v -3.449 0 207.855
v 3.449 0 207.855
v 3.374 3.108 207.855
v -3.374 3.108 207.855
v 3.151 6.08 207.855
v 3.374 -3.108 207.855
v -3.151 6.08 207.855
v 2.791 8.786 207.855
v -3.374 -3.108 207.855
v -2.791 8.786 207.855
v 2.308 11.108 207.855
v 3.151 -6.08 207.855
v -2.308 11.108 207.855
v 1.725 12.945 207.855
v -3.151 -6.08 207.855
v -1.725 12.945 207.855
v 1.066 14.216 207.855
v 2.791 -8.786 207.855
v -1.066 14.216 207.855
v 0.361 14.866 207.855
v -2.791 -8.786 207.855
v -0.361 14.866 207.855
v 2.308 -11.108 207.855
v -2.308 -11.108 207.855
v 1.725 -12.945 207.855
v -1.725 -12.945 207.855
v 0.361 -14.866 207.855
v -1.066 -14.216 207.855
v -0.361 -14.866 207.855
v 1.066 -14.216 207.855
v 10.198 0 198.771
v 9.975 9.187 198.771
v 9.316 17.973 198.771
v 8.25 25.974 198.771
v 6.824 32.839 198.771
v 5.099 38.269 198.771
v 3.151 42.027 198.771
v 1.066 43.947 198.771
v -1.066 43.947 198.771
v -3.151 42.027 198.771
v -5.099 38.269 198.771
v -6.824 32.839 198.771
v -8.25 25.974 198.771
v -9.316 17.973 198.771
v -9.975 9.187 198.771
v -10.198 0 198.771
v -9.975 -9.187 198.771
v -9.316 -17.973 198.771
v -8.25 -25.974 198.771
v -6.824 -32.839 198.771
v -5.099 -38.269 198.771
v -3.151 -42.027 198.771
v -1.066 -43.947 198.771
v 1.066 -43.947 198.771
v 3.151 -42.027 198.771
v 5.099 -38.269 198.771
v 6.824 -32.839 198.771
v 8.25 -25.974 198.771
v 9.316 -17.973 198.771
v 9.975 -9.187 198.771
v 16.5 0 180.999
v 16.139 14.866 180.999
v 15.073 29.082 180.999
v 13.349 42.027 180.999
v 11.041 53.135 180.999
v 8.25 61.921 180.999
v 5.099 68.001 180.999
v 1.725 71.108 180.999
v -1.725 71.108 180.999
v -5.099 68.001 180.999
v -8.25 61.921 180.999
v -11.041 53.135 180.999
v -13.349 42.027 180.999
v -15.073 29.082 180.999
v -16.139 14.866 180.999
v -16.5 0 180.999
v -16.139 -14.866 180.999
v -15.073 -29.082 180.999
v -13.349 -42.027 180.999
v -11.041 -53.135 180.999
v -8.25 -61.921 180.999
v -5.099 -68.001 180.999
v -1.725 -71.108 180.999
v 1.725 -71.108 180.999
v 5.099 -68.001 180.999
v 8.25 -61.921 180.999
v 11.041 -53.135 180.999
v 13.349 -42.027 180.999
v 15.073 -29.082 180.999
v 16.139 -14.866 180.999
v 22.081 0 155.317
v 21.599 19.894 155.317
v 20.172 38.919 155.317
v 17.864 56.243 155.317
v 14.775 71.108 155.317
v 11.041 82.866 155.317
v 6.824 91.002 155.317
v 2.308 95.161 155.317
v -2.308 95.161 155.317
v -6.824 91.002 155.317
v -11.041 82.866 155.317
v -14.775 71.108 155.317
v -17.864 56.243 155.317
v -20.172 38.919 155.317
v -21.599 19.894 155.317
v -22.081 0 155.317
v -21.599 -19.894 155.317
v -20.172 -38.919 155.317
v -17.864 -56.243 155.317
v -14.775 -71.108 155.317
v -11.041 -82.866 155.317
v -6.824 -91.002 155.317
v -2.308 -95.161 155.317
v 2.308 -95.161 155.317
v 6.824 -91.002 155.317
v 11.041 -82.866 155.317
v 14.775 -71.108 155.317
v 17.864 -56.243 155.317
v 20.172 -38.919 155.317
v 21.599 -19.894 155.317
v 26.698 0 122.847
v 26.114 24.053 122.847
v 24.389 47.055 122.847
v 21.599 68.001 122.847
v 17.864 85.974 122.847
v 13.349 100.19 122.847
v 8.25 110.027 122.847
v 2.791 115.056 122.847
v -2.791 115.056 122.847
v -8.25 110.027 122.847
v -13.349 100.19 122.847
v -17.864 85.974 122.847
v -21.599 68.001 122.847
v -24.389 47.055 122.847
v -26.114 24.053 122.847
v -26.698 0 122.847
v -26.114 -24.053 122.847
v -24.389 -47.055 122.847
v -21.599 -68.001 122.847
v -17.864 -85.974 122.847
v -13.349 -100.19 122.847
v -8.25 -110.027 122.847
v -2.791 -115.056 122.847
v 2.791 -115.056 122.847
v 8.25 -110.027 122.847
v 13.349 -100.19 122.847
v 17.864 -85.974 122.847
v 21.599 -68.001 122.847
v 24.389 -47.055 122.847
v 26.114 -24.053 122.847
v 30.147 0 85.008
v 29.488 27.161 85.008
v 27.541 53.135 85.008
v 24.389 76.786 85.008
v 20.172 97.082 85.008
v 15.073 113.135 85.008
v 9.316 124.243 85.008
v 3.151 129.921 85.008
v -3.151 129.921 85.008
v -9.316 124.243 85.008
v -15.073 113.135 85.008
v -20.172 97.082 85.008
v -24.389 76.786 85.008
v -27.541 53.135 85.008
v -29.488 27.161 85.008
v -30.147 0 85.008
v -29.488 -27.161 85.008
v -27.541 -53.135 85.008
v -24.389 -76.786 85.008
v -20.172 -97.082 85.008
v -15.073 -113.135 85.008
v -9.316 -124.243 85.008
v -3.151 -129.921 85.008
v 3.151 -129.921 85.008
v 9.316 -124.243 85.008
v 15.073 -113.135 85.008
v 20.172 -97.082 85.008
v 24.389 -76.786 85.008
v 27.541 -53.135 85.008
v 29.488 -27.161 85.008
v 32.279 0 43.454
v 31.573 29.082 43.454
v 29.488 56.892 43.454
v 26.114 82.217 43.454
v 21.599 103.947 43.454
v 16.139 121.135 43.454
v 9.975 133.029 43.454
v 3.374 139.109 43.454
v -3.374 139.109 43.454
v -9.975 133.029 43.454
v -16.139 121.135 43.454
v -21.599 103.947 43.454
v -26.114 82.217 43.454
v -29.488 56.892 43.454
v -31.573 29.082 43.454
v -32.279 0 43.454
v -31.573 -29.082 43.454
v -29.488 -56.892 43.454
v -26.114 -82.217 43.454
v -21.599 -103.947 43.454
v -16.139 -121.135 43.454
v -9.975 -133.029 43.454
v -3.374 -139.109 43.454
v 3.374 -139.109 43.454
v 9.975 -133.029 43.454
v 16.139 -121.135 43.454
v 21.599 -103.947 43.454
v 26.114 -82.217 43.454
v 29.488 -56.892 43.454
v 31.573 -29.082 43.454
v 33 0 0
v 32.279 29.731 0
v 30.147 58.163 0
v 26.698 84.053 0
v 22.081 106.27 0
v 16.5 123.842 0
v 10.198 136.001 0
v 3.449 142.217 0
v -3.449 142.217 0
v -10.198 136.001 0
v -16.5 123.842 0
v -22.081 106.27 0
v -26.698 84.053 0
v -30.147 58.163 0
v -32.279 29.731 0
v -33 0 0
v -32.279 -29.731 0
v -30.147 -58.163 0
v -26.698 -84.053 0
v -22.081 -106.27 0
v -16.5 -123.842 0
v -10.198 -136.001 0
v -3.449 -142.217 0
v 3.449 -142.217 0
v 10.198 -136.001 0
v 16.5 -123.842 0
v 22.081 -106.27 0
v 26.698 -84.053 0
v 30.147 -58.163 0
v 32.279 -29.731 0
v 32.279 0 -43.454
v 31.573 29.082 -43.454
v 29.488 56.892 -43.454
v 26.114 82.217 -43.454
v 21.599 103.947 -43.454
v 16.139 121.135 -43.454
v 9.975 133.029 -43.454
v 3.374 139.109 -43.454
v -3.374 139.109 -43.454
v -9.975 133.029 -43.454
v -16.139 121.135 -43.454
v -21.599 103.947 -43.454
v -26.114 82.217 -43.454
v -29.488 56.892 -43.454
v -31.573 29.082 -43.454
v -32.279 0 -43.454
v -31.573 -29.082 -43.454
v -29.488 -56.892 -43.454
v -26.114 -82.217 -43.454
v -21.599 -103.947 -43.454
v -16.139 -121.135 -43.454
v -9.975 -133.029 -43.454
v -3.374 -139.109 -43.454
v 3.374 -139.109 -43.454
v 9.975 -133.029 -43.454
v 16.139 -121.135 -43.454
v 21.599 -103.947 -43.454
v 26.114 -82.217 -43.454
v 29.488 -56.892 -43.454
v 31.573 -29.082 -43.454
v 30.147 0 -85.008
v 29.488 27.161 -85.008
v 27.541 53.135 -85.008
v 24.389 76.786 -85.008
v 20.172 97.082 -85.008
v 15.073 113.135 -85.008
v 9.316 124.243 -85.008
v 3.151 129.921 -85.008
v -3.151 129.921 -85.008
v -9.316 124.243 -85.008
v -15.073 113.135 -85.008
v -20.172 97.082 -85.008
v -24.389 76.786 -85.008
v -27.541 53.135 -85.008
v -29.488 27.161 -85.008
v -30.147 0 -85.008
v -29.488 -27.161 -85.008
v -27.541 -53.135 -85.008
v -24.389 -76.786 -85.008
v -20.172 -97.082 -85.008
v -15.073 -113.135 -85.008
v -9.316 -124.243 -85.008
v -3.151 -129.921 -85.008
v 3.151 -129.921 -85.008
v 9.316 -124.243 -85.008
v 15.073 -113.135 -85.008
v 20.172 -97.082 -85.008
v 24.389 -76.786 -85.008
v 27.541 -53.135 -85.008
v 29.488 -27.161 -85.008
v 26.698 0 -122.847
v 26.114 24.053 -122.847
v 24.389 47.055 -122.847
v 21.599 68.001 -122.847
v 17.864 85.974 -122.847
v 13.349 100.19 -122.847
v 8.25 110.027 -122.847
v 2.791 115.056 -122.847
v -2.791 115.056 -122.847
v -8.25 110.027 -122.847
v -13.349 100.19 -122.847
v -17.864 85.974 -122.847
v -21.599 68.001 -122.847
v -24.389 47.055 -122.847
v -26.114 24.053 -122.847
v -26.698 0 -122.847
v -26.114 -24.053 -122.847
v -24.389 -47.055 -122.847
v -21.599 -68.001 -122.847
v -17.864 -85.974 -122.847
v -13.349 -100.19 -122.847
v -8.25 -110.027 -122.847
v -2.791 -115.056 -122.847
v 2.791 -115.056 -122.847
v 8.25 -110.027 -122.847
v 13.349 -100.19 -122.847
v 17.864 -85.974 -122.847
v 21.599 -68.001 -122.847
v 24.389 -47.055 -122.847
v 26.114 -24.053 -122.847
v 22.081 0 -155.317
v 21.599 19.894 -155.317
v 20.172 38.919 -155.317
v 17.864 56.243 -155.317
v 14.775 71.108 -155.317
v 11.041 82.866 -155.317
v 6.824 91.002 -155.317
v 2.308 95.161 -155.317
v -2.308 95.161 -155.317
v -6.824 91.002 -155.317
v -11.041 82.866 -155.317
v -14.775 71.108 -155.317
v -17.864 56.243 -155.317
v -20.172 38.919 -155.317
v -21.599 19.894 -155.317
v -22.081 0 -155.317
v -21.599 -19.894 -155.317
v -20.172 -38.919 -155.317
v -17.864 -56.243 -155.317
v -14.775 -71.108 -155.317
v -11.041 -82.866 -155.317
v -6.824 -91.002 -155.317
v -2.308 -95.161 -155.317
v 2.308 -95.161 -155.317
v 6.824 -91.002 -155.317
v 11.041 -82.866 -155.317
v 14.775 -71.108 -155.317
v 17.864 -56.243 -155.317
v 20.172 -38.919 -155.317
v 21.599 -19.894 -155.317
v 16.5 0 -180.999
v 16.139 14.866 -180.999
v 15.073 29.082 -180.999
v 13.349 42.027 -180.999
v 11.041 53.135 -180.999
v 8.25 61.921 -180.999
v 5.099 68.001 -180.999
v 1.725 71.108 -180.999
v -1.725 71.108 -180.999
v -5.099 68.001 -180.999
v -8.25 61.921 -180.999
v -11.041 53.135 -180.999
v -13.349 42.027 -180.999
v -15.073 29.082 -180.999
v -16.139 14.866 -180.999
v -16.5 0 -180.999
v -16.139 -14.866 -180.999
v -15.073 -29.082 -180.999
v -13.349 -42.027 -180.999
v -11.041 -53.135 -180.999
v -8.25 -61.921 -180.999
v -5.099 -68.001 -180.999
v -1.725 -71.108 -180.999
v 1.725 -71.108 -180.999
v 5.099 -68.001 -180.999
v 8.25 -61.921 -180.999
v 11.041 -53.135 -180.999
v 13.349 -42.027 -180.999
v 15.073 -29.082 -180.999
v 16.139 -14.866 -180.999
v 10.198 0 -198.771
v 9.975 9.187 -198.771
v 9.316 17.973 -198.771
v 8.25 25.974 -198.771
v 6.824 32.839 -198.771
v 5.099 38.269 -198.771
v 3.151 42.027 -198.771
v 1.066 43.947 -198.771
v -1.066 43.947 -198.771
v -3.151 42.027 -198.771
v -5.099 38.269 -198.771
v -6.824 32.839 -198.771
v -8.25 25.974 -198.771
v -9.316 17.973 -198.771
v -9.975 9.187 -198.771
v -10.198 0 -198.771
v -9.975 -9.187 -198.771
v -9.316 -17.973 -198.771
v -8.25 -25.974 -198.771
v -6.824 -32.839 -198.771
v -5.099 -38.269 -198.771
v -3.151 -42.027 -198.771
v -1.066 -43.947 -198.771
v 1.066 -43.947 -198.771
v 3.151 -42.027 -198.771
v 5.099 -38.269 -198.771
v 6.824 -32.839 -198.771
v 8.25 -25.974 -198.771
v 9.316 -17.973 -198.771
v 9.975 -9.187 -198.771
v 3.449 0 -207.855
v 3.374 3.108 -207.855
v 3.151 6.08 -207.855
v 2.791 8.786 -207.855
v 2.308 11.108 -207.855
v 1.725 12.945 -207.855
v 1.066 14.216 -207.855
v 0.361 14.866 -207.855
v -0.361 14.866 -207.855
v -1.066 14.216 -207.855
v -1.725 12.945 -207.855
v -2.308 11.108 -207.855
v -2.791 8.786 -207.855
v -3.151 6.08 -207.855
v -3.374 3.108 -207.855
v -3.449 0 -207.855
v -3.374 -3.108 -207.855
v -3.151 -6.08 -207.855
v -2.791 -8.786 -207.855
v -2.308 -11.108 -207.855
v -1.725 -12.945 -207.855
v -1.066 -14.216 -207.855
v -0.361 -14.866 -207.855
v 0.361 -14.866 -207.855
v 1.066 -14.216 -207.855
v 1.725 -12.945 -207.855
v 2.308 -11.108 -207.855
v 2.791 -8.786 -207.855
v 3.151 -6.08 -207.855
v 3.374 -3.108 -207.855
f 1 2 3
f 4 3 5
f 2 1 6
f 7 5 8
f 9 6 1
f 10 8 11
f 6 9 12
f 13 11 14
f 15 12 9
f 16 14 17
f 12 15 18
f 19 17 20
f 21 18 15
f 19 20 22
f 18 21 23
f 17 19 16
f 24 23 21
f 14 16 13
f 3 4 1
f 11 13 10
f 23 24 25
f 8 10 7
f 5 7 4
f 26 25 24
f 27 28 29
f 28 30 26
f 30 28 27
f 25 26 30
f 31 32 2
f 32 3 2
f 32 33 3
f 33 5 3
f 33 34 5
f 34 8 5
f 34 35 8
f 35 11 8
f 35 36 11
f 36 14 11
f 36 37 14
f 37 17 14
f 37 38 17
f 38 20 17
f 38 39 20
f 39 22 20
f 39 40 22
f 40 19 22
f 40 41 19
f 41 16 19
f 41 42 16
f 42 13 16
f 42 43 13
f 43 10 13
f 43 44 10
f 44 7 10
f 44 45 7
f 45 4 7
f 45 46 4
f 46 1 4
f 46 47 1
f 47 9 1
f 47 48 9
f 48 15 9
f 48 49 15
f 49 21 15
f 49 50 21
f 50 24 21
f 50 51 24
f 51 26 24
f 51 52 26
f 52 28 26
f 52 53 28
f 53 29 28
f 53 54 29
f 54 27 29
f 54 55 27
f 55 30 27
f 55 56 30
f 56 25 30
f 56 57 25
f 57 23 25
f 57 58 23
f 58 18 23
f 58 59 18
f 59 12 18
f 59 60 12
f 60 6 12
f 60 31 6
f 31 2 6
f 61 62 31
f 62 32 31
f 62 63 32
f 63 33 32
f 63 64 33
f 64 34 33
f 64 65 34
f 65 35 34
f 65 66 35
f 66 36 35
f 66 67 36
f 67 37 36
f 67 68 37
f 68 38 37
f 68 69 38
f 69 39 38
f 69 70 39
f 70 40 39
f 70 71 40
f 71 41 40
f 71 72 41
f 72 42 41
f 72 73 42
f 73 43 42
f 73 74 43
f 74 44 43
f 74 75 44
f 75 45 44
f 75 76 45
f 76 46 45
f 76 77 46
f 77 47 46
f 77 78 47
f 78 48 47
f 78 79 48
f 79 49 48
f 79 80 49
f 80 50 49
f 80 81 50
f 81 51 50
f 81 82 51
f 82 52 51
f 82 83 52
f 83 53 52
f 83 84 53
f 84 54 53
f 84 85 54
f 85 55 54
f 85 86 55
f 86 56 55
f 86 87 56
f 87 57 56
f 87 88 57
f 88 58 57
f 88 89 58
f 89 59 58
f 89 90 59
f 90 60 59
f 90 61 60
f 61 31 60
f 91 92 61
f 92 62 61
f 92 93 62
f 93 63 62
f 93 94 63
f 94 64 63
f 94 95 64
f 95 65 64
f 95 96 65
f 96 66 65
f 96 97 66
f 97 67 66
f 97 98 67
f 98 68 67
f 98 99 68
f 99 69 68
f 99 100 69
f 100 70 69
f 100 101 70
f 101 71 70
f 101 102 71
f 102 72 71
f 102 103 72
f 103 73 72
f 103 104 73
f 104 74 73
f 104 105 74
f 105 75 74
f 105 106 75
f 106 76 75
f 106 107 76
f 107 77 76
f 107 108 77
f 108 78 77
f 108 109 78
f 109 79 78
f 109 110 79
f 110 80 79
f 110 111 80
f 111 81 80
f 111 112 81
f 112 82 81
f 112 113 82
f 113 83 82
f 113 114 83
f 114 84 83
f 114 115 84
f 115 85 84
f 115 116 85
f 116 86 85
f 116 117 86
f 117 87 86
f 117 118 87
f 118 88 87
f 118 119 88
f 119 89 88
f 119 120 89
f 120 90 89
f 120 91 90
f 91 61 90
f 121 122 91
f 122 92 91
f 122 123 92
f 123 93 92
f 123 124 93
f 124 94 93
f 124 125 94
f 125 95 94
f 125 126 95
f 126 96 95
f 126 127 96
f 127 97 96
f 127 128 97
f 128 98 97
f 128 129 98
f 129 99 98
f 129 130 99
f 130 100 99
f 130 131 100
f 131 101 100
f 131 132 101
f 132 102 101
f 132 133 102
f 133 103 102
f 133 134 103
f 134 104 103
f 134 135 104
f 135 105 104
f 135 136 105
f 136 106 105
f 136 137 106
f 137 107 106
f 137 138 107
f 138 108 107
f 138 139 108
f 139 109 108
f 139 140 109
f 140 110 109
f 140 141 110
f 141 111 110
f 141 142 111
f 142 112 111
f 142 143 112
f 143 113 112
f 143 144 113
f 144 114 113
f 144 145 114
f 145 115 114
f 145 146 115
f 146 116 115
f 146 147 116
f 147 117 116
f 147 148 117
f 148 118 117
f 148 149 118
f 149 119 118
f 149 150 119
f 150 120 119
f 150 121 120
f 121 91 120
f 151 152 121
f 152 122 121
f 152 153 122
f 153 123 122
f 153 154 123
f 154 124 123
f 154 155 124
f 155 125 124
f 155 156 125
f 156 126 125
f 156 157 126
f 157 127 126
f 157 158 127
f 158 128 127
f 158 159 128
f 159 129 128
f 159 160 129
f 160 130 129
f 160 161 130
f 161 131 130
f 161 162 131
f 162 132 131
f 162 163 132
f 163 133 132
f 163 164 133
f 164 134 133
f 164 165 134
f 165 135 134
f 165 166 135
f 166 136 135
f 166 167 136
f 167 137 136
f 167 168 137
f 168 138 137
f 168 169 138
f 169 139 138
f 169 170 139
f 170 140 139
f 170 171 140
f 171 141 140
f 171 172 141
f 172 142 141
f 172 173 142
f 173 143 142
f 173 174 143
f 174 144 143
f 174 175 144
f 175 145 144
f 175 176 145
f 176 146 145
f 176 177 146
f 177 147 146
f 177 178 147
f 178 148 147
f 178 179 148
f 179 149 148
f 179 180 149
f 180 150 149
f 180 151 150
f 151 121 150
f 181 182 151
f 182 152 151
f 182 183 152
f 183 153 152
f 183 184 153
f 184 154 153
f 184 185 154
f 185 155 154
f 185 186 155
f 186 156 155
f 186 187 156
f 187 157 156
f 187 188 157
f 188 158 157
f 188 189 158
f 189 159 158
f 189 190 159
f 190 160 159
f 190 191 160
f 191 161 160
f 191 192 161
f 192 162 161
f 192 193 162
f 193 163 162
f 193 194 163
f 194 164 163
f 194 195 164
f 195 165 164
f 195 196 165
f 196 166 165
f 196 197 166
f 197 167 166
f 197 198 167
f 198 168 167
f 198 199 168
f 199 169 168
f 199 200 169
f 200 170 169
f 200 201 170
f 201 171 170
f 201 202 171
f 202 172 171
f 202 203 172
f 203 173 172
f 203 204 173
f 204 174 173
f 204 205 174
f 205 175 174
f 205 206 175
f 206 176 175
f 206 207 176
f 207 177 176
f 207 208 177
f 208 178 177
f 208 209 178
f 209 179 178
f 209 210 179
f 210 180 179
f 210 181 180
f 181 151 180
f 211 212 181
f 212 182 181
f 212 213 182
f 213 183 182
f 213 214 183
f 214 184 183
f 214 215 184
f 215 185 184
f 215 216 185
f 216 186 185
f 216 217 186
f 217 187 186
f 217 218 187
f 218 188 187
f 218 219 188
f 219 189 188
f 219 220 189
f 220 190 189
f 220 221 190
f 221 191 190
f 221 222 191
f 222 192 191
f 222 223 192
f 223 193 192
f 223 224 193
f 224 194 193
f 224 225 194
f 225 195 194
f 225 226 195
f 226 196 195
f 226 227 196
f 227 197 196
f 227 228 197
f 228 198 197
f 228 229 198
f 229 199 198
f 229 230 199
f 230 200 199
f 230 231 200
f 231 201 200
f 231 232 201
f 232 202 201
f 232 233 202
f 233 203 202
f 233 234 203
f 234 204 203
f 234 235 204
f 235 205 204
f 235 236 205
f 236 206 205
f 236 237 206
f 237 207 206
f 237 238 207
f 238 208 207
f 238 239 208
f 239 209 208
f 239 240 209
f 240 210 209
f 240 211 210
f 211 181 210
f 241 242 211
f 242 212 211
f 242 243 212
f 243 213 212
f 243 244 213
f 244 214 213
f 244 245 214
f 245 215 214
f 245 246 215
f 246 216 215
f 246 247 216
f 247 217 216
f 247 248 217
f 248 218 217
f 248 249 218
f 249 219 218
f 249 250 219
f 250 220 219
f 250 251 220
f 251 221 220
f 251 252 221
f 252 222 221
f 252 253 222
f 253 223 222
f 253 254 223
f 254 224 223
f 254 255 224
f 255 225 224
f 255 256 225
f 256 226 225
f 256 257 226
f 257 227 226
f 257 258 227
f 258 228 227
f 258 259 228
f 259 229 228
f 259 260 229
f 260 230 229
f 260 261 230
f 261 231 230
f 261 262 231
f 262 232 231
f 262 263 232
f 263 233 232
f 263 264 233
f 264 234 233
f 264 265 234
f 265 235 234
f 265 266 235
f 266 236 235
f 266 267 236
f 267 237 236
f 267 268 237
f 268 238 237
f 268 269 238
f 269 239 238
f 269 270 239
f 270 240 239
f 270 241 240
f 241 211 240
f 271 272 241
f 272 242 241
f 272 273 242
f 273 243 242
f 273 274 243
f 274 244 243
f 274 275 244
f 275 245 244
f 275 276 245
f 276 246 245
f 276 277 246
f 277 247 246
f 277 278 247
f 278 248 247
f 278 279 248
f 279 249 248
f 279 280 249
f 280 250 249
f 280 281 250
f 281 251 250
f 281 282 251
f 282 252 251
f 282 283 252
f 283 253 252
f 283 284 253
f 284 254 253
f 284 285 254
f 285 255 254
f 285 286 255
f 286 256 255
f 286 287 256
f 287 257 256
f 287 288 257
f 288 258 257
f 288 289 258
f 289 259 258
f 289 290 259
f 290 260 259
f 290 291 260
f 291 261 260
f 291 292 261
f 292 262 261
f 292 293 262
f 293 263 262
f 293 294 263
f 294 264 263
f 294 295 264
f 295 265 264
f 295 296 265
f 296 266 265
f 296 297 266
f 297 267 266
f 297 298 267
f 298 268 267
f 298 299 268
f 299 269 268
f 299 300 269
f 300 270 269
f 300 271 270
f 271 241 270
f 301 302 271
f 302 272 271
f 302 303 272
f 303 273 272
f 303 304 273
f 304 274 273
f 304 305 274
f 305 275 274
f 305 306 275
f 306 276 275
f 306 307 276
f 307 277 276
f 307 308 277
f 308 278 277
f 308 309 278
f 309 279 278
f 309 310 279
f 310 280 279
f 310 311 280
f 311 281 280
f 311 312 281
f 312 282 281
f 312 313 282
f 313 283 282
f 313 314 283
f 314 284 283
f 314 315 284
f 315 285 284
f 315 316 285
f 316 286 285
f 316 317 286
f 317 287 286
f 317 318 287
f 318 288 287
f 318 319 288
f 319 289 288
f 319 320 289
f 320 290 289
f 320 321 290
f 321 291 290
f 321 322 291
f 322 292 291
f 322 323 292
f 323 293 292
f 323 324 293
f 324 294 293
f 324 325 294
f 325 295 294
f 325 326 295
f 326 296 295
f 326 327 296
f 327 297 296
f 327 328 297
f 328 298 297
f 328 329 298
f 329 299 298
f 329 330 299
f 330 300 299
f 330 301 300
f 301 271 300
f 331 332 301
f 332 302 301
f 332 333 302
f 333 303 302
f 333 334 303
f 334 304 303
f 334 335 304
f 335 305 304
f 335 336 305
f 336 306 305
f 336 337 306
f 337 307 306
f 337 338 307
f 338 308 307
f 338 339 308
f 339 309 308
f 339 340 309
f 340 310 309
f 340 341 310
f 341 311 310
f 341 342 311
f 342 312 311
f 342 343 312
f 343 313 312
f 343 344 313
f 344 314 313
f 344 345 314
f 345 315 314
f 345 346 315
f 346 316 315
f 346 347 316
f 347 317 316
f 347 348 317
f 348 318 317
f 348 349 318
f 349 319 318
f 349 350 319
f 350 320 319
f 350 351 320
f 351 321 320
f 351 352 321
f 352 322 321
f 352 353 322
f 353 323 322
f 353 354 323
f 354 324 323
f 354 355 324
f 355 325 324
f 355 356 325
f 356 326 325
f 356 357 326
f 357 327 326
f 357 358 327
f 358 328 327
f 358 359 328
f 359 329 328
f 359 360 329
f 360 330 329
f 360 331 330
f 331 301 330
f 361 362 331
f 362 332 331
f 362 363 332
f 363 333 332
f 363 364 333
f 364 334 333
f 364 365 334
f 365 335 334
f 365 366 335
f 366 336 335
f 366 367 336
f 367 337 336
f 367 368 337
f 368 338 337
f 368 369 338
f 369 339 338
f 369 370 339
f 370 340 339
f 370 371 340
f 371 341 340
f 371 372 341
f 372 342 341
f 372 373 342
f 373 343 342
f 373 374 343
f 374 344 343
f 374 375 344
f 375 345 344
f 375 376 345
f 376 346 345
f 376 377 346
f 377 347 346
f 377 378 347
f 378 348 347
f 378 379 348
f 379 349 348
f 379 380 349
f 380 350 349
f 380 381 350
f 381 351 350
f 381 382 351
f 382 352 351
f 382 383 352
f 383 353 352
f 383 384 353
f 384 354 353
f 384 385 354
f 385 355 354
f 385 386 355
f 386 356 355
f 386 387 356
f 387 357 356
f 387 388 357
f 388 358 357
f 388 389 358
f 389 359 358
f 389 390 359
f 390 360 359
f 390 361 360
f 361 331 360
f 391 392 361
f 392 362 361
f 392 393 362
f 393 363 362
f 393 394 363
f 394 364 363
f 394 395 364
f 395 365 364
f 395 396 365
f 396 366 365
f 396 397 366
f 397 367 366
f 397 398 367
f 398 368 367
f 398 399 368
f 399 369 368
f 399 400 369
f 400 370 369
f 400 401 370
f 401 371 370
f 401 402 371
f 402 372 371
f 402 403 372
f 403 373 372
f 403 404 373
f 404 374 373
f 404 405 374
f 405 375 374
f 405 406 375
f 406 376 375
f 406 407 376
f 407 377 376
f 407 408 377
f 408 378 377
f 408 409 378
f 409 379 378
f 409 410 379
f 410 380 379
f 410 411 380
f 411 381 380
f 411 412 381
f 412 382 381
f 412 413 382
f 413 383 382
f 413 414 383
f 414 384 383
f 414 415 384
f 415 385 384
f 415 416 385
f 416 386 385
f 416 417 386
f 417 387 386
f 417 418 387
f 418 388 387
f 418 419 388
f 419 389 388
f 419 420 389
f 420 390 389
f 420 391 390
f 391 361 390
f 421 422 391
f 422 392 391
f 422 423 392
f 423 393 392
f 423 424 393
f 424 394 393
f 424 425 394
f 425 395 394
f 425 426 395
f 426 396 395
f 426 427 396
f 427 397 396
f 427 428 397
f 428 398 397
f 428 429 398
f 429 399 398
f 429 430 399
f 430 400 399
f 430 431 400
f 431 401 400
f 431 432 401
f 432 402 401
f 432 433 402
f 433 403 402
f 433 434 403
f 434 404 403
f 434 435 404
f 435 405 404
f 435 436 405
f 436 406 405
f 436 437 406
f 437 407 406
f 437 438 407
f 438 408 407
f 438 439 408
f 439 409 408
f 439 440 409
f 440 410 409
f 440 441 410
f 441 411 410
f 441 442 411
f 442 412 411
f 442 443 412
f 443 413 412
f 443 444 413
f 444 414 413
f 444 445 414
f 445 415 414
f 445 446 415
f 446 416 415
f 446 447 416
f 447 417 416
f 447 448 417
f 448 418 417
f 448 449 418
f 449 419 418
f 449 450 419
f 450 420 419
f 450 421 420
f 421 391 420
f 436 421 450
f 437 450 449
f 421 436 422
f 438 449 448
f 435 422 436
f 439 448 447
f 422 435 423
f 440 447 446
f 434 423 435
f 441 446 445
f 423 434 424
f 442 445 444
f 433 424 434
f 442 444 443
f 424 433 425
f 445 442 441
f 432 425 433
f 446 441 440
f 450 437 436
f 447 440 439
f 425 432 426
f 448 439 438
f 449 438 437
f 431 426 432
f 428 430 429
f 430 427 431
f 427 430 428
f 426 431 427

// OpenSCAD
// Generated by SolidPython 1.0.1 on 2020-07-29 00:46:45


scale(v = [3, 13, 19]) {
	sphere(r = 11);
}
/***********************************************
*********      SolidPython code:      **********
************************************************
 
# import packages: SolidPython
from solid import *
from solid.utils import *
from itertools import chain, combinations, permutations


class Resize:

    def __init__(self, scad_file):
        self.scad_file = scad_file
        #self.scad_file = import_scad(scad_file)
        # cone/cylinder param:
        self.r1 = 0
        self.r2 = 0
        self.h = 0
        # rectangular prism param:
        self.w = 0
        self.l = 0
        # ellipse param:
        self.r = 0

    # import OpenScad code (file name corresponds to shape)


    # classify shape + parameters
    def assign(self, param1, param2, param3):
        if self.scad_file == 'cone.scad':
            self.r1 = param1
            self.r2 = param2
            self.h = param3
        elif self.scad_file == 'cylinder.scad':
            self.r1 = param1
            self.r2 = param2
            self.h = param3
        elif self.scad_file == 'rectangularPrism.scad':
            self.h = param1
            self.l = param2
            self.w = param3
        else:
            self.r = param1
            self.h = param2

    # resize parameters
    def iterate(self):
        x = range(3, 20, 2)
        i = 1
        if self.scad_file == 'cone.scad':
            tempList = list(permutations(x, 2))
            for temp in tempList:
                param1 = temp[0]
                param2 = temp[1]
                filepath = 'produced_scad_files/' + 'cone' + str(param1) + '_' + str(param2) + '_' + '.scad'
                scad_render_to_file(cylinder(h=param1, r1=param2, r2=0), filepath)

        elif self.scad_file == 'cylinder.scad':
            tempList = list(permutations(x, 3))
            for temp in tempList:
                param1 = temp[0]
                param2 = temp[1]
                filepath = 'produced_scad_files/' + 'cylinder' + str(param1) + '_' + str(param2) + '_' + '.scad'
                scad_render_to_file(cylinder(h=param1, r1=param2, r2=param2), filepath)

        elif self.scad_file == 'rectangularPrism.scad':
            tempList = list(permutations(x, 3))
            for temp in tempList:
                param1 = temp[0]
                param2 = temp[1]
                param3 = temp[2]
                filepath = 'produced_scad_files/' + 'rectangularPrism' + str(param1) + '_' + str(param2) + '_' + str(
                    param3) + '.scad'
                scad_render_to_file(cube(size=(param1, param2, param3)), filepath)

        elif self.scad_file == 'ellipse.scad':
            tempList = list(permutations(x, 4))
            for temp in tempList:
                param1 = temp[0]
                param2 = temp[1]
                param3 = temp[2]
                param4 = temp[3]
                filepath = 'produced_scad_files/' + 'ellipse' + str(param1) + '_' + str(param2) + '_' + str(param3) + '_' + str(param4) + '.scad'
                scad_render_to_file(scale([param1, param2, param3])(sphere(r=param4)), filepath)

    def render_to_scadfile(self):
        scad_render_to_file(scad, 'example.scad') 
 
************************************************/
